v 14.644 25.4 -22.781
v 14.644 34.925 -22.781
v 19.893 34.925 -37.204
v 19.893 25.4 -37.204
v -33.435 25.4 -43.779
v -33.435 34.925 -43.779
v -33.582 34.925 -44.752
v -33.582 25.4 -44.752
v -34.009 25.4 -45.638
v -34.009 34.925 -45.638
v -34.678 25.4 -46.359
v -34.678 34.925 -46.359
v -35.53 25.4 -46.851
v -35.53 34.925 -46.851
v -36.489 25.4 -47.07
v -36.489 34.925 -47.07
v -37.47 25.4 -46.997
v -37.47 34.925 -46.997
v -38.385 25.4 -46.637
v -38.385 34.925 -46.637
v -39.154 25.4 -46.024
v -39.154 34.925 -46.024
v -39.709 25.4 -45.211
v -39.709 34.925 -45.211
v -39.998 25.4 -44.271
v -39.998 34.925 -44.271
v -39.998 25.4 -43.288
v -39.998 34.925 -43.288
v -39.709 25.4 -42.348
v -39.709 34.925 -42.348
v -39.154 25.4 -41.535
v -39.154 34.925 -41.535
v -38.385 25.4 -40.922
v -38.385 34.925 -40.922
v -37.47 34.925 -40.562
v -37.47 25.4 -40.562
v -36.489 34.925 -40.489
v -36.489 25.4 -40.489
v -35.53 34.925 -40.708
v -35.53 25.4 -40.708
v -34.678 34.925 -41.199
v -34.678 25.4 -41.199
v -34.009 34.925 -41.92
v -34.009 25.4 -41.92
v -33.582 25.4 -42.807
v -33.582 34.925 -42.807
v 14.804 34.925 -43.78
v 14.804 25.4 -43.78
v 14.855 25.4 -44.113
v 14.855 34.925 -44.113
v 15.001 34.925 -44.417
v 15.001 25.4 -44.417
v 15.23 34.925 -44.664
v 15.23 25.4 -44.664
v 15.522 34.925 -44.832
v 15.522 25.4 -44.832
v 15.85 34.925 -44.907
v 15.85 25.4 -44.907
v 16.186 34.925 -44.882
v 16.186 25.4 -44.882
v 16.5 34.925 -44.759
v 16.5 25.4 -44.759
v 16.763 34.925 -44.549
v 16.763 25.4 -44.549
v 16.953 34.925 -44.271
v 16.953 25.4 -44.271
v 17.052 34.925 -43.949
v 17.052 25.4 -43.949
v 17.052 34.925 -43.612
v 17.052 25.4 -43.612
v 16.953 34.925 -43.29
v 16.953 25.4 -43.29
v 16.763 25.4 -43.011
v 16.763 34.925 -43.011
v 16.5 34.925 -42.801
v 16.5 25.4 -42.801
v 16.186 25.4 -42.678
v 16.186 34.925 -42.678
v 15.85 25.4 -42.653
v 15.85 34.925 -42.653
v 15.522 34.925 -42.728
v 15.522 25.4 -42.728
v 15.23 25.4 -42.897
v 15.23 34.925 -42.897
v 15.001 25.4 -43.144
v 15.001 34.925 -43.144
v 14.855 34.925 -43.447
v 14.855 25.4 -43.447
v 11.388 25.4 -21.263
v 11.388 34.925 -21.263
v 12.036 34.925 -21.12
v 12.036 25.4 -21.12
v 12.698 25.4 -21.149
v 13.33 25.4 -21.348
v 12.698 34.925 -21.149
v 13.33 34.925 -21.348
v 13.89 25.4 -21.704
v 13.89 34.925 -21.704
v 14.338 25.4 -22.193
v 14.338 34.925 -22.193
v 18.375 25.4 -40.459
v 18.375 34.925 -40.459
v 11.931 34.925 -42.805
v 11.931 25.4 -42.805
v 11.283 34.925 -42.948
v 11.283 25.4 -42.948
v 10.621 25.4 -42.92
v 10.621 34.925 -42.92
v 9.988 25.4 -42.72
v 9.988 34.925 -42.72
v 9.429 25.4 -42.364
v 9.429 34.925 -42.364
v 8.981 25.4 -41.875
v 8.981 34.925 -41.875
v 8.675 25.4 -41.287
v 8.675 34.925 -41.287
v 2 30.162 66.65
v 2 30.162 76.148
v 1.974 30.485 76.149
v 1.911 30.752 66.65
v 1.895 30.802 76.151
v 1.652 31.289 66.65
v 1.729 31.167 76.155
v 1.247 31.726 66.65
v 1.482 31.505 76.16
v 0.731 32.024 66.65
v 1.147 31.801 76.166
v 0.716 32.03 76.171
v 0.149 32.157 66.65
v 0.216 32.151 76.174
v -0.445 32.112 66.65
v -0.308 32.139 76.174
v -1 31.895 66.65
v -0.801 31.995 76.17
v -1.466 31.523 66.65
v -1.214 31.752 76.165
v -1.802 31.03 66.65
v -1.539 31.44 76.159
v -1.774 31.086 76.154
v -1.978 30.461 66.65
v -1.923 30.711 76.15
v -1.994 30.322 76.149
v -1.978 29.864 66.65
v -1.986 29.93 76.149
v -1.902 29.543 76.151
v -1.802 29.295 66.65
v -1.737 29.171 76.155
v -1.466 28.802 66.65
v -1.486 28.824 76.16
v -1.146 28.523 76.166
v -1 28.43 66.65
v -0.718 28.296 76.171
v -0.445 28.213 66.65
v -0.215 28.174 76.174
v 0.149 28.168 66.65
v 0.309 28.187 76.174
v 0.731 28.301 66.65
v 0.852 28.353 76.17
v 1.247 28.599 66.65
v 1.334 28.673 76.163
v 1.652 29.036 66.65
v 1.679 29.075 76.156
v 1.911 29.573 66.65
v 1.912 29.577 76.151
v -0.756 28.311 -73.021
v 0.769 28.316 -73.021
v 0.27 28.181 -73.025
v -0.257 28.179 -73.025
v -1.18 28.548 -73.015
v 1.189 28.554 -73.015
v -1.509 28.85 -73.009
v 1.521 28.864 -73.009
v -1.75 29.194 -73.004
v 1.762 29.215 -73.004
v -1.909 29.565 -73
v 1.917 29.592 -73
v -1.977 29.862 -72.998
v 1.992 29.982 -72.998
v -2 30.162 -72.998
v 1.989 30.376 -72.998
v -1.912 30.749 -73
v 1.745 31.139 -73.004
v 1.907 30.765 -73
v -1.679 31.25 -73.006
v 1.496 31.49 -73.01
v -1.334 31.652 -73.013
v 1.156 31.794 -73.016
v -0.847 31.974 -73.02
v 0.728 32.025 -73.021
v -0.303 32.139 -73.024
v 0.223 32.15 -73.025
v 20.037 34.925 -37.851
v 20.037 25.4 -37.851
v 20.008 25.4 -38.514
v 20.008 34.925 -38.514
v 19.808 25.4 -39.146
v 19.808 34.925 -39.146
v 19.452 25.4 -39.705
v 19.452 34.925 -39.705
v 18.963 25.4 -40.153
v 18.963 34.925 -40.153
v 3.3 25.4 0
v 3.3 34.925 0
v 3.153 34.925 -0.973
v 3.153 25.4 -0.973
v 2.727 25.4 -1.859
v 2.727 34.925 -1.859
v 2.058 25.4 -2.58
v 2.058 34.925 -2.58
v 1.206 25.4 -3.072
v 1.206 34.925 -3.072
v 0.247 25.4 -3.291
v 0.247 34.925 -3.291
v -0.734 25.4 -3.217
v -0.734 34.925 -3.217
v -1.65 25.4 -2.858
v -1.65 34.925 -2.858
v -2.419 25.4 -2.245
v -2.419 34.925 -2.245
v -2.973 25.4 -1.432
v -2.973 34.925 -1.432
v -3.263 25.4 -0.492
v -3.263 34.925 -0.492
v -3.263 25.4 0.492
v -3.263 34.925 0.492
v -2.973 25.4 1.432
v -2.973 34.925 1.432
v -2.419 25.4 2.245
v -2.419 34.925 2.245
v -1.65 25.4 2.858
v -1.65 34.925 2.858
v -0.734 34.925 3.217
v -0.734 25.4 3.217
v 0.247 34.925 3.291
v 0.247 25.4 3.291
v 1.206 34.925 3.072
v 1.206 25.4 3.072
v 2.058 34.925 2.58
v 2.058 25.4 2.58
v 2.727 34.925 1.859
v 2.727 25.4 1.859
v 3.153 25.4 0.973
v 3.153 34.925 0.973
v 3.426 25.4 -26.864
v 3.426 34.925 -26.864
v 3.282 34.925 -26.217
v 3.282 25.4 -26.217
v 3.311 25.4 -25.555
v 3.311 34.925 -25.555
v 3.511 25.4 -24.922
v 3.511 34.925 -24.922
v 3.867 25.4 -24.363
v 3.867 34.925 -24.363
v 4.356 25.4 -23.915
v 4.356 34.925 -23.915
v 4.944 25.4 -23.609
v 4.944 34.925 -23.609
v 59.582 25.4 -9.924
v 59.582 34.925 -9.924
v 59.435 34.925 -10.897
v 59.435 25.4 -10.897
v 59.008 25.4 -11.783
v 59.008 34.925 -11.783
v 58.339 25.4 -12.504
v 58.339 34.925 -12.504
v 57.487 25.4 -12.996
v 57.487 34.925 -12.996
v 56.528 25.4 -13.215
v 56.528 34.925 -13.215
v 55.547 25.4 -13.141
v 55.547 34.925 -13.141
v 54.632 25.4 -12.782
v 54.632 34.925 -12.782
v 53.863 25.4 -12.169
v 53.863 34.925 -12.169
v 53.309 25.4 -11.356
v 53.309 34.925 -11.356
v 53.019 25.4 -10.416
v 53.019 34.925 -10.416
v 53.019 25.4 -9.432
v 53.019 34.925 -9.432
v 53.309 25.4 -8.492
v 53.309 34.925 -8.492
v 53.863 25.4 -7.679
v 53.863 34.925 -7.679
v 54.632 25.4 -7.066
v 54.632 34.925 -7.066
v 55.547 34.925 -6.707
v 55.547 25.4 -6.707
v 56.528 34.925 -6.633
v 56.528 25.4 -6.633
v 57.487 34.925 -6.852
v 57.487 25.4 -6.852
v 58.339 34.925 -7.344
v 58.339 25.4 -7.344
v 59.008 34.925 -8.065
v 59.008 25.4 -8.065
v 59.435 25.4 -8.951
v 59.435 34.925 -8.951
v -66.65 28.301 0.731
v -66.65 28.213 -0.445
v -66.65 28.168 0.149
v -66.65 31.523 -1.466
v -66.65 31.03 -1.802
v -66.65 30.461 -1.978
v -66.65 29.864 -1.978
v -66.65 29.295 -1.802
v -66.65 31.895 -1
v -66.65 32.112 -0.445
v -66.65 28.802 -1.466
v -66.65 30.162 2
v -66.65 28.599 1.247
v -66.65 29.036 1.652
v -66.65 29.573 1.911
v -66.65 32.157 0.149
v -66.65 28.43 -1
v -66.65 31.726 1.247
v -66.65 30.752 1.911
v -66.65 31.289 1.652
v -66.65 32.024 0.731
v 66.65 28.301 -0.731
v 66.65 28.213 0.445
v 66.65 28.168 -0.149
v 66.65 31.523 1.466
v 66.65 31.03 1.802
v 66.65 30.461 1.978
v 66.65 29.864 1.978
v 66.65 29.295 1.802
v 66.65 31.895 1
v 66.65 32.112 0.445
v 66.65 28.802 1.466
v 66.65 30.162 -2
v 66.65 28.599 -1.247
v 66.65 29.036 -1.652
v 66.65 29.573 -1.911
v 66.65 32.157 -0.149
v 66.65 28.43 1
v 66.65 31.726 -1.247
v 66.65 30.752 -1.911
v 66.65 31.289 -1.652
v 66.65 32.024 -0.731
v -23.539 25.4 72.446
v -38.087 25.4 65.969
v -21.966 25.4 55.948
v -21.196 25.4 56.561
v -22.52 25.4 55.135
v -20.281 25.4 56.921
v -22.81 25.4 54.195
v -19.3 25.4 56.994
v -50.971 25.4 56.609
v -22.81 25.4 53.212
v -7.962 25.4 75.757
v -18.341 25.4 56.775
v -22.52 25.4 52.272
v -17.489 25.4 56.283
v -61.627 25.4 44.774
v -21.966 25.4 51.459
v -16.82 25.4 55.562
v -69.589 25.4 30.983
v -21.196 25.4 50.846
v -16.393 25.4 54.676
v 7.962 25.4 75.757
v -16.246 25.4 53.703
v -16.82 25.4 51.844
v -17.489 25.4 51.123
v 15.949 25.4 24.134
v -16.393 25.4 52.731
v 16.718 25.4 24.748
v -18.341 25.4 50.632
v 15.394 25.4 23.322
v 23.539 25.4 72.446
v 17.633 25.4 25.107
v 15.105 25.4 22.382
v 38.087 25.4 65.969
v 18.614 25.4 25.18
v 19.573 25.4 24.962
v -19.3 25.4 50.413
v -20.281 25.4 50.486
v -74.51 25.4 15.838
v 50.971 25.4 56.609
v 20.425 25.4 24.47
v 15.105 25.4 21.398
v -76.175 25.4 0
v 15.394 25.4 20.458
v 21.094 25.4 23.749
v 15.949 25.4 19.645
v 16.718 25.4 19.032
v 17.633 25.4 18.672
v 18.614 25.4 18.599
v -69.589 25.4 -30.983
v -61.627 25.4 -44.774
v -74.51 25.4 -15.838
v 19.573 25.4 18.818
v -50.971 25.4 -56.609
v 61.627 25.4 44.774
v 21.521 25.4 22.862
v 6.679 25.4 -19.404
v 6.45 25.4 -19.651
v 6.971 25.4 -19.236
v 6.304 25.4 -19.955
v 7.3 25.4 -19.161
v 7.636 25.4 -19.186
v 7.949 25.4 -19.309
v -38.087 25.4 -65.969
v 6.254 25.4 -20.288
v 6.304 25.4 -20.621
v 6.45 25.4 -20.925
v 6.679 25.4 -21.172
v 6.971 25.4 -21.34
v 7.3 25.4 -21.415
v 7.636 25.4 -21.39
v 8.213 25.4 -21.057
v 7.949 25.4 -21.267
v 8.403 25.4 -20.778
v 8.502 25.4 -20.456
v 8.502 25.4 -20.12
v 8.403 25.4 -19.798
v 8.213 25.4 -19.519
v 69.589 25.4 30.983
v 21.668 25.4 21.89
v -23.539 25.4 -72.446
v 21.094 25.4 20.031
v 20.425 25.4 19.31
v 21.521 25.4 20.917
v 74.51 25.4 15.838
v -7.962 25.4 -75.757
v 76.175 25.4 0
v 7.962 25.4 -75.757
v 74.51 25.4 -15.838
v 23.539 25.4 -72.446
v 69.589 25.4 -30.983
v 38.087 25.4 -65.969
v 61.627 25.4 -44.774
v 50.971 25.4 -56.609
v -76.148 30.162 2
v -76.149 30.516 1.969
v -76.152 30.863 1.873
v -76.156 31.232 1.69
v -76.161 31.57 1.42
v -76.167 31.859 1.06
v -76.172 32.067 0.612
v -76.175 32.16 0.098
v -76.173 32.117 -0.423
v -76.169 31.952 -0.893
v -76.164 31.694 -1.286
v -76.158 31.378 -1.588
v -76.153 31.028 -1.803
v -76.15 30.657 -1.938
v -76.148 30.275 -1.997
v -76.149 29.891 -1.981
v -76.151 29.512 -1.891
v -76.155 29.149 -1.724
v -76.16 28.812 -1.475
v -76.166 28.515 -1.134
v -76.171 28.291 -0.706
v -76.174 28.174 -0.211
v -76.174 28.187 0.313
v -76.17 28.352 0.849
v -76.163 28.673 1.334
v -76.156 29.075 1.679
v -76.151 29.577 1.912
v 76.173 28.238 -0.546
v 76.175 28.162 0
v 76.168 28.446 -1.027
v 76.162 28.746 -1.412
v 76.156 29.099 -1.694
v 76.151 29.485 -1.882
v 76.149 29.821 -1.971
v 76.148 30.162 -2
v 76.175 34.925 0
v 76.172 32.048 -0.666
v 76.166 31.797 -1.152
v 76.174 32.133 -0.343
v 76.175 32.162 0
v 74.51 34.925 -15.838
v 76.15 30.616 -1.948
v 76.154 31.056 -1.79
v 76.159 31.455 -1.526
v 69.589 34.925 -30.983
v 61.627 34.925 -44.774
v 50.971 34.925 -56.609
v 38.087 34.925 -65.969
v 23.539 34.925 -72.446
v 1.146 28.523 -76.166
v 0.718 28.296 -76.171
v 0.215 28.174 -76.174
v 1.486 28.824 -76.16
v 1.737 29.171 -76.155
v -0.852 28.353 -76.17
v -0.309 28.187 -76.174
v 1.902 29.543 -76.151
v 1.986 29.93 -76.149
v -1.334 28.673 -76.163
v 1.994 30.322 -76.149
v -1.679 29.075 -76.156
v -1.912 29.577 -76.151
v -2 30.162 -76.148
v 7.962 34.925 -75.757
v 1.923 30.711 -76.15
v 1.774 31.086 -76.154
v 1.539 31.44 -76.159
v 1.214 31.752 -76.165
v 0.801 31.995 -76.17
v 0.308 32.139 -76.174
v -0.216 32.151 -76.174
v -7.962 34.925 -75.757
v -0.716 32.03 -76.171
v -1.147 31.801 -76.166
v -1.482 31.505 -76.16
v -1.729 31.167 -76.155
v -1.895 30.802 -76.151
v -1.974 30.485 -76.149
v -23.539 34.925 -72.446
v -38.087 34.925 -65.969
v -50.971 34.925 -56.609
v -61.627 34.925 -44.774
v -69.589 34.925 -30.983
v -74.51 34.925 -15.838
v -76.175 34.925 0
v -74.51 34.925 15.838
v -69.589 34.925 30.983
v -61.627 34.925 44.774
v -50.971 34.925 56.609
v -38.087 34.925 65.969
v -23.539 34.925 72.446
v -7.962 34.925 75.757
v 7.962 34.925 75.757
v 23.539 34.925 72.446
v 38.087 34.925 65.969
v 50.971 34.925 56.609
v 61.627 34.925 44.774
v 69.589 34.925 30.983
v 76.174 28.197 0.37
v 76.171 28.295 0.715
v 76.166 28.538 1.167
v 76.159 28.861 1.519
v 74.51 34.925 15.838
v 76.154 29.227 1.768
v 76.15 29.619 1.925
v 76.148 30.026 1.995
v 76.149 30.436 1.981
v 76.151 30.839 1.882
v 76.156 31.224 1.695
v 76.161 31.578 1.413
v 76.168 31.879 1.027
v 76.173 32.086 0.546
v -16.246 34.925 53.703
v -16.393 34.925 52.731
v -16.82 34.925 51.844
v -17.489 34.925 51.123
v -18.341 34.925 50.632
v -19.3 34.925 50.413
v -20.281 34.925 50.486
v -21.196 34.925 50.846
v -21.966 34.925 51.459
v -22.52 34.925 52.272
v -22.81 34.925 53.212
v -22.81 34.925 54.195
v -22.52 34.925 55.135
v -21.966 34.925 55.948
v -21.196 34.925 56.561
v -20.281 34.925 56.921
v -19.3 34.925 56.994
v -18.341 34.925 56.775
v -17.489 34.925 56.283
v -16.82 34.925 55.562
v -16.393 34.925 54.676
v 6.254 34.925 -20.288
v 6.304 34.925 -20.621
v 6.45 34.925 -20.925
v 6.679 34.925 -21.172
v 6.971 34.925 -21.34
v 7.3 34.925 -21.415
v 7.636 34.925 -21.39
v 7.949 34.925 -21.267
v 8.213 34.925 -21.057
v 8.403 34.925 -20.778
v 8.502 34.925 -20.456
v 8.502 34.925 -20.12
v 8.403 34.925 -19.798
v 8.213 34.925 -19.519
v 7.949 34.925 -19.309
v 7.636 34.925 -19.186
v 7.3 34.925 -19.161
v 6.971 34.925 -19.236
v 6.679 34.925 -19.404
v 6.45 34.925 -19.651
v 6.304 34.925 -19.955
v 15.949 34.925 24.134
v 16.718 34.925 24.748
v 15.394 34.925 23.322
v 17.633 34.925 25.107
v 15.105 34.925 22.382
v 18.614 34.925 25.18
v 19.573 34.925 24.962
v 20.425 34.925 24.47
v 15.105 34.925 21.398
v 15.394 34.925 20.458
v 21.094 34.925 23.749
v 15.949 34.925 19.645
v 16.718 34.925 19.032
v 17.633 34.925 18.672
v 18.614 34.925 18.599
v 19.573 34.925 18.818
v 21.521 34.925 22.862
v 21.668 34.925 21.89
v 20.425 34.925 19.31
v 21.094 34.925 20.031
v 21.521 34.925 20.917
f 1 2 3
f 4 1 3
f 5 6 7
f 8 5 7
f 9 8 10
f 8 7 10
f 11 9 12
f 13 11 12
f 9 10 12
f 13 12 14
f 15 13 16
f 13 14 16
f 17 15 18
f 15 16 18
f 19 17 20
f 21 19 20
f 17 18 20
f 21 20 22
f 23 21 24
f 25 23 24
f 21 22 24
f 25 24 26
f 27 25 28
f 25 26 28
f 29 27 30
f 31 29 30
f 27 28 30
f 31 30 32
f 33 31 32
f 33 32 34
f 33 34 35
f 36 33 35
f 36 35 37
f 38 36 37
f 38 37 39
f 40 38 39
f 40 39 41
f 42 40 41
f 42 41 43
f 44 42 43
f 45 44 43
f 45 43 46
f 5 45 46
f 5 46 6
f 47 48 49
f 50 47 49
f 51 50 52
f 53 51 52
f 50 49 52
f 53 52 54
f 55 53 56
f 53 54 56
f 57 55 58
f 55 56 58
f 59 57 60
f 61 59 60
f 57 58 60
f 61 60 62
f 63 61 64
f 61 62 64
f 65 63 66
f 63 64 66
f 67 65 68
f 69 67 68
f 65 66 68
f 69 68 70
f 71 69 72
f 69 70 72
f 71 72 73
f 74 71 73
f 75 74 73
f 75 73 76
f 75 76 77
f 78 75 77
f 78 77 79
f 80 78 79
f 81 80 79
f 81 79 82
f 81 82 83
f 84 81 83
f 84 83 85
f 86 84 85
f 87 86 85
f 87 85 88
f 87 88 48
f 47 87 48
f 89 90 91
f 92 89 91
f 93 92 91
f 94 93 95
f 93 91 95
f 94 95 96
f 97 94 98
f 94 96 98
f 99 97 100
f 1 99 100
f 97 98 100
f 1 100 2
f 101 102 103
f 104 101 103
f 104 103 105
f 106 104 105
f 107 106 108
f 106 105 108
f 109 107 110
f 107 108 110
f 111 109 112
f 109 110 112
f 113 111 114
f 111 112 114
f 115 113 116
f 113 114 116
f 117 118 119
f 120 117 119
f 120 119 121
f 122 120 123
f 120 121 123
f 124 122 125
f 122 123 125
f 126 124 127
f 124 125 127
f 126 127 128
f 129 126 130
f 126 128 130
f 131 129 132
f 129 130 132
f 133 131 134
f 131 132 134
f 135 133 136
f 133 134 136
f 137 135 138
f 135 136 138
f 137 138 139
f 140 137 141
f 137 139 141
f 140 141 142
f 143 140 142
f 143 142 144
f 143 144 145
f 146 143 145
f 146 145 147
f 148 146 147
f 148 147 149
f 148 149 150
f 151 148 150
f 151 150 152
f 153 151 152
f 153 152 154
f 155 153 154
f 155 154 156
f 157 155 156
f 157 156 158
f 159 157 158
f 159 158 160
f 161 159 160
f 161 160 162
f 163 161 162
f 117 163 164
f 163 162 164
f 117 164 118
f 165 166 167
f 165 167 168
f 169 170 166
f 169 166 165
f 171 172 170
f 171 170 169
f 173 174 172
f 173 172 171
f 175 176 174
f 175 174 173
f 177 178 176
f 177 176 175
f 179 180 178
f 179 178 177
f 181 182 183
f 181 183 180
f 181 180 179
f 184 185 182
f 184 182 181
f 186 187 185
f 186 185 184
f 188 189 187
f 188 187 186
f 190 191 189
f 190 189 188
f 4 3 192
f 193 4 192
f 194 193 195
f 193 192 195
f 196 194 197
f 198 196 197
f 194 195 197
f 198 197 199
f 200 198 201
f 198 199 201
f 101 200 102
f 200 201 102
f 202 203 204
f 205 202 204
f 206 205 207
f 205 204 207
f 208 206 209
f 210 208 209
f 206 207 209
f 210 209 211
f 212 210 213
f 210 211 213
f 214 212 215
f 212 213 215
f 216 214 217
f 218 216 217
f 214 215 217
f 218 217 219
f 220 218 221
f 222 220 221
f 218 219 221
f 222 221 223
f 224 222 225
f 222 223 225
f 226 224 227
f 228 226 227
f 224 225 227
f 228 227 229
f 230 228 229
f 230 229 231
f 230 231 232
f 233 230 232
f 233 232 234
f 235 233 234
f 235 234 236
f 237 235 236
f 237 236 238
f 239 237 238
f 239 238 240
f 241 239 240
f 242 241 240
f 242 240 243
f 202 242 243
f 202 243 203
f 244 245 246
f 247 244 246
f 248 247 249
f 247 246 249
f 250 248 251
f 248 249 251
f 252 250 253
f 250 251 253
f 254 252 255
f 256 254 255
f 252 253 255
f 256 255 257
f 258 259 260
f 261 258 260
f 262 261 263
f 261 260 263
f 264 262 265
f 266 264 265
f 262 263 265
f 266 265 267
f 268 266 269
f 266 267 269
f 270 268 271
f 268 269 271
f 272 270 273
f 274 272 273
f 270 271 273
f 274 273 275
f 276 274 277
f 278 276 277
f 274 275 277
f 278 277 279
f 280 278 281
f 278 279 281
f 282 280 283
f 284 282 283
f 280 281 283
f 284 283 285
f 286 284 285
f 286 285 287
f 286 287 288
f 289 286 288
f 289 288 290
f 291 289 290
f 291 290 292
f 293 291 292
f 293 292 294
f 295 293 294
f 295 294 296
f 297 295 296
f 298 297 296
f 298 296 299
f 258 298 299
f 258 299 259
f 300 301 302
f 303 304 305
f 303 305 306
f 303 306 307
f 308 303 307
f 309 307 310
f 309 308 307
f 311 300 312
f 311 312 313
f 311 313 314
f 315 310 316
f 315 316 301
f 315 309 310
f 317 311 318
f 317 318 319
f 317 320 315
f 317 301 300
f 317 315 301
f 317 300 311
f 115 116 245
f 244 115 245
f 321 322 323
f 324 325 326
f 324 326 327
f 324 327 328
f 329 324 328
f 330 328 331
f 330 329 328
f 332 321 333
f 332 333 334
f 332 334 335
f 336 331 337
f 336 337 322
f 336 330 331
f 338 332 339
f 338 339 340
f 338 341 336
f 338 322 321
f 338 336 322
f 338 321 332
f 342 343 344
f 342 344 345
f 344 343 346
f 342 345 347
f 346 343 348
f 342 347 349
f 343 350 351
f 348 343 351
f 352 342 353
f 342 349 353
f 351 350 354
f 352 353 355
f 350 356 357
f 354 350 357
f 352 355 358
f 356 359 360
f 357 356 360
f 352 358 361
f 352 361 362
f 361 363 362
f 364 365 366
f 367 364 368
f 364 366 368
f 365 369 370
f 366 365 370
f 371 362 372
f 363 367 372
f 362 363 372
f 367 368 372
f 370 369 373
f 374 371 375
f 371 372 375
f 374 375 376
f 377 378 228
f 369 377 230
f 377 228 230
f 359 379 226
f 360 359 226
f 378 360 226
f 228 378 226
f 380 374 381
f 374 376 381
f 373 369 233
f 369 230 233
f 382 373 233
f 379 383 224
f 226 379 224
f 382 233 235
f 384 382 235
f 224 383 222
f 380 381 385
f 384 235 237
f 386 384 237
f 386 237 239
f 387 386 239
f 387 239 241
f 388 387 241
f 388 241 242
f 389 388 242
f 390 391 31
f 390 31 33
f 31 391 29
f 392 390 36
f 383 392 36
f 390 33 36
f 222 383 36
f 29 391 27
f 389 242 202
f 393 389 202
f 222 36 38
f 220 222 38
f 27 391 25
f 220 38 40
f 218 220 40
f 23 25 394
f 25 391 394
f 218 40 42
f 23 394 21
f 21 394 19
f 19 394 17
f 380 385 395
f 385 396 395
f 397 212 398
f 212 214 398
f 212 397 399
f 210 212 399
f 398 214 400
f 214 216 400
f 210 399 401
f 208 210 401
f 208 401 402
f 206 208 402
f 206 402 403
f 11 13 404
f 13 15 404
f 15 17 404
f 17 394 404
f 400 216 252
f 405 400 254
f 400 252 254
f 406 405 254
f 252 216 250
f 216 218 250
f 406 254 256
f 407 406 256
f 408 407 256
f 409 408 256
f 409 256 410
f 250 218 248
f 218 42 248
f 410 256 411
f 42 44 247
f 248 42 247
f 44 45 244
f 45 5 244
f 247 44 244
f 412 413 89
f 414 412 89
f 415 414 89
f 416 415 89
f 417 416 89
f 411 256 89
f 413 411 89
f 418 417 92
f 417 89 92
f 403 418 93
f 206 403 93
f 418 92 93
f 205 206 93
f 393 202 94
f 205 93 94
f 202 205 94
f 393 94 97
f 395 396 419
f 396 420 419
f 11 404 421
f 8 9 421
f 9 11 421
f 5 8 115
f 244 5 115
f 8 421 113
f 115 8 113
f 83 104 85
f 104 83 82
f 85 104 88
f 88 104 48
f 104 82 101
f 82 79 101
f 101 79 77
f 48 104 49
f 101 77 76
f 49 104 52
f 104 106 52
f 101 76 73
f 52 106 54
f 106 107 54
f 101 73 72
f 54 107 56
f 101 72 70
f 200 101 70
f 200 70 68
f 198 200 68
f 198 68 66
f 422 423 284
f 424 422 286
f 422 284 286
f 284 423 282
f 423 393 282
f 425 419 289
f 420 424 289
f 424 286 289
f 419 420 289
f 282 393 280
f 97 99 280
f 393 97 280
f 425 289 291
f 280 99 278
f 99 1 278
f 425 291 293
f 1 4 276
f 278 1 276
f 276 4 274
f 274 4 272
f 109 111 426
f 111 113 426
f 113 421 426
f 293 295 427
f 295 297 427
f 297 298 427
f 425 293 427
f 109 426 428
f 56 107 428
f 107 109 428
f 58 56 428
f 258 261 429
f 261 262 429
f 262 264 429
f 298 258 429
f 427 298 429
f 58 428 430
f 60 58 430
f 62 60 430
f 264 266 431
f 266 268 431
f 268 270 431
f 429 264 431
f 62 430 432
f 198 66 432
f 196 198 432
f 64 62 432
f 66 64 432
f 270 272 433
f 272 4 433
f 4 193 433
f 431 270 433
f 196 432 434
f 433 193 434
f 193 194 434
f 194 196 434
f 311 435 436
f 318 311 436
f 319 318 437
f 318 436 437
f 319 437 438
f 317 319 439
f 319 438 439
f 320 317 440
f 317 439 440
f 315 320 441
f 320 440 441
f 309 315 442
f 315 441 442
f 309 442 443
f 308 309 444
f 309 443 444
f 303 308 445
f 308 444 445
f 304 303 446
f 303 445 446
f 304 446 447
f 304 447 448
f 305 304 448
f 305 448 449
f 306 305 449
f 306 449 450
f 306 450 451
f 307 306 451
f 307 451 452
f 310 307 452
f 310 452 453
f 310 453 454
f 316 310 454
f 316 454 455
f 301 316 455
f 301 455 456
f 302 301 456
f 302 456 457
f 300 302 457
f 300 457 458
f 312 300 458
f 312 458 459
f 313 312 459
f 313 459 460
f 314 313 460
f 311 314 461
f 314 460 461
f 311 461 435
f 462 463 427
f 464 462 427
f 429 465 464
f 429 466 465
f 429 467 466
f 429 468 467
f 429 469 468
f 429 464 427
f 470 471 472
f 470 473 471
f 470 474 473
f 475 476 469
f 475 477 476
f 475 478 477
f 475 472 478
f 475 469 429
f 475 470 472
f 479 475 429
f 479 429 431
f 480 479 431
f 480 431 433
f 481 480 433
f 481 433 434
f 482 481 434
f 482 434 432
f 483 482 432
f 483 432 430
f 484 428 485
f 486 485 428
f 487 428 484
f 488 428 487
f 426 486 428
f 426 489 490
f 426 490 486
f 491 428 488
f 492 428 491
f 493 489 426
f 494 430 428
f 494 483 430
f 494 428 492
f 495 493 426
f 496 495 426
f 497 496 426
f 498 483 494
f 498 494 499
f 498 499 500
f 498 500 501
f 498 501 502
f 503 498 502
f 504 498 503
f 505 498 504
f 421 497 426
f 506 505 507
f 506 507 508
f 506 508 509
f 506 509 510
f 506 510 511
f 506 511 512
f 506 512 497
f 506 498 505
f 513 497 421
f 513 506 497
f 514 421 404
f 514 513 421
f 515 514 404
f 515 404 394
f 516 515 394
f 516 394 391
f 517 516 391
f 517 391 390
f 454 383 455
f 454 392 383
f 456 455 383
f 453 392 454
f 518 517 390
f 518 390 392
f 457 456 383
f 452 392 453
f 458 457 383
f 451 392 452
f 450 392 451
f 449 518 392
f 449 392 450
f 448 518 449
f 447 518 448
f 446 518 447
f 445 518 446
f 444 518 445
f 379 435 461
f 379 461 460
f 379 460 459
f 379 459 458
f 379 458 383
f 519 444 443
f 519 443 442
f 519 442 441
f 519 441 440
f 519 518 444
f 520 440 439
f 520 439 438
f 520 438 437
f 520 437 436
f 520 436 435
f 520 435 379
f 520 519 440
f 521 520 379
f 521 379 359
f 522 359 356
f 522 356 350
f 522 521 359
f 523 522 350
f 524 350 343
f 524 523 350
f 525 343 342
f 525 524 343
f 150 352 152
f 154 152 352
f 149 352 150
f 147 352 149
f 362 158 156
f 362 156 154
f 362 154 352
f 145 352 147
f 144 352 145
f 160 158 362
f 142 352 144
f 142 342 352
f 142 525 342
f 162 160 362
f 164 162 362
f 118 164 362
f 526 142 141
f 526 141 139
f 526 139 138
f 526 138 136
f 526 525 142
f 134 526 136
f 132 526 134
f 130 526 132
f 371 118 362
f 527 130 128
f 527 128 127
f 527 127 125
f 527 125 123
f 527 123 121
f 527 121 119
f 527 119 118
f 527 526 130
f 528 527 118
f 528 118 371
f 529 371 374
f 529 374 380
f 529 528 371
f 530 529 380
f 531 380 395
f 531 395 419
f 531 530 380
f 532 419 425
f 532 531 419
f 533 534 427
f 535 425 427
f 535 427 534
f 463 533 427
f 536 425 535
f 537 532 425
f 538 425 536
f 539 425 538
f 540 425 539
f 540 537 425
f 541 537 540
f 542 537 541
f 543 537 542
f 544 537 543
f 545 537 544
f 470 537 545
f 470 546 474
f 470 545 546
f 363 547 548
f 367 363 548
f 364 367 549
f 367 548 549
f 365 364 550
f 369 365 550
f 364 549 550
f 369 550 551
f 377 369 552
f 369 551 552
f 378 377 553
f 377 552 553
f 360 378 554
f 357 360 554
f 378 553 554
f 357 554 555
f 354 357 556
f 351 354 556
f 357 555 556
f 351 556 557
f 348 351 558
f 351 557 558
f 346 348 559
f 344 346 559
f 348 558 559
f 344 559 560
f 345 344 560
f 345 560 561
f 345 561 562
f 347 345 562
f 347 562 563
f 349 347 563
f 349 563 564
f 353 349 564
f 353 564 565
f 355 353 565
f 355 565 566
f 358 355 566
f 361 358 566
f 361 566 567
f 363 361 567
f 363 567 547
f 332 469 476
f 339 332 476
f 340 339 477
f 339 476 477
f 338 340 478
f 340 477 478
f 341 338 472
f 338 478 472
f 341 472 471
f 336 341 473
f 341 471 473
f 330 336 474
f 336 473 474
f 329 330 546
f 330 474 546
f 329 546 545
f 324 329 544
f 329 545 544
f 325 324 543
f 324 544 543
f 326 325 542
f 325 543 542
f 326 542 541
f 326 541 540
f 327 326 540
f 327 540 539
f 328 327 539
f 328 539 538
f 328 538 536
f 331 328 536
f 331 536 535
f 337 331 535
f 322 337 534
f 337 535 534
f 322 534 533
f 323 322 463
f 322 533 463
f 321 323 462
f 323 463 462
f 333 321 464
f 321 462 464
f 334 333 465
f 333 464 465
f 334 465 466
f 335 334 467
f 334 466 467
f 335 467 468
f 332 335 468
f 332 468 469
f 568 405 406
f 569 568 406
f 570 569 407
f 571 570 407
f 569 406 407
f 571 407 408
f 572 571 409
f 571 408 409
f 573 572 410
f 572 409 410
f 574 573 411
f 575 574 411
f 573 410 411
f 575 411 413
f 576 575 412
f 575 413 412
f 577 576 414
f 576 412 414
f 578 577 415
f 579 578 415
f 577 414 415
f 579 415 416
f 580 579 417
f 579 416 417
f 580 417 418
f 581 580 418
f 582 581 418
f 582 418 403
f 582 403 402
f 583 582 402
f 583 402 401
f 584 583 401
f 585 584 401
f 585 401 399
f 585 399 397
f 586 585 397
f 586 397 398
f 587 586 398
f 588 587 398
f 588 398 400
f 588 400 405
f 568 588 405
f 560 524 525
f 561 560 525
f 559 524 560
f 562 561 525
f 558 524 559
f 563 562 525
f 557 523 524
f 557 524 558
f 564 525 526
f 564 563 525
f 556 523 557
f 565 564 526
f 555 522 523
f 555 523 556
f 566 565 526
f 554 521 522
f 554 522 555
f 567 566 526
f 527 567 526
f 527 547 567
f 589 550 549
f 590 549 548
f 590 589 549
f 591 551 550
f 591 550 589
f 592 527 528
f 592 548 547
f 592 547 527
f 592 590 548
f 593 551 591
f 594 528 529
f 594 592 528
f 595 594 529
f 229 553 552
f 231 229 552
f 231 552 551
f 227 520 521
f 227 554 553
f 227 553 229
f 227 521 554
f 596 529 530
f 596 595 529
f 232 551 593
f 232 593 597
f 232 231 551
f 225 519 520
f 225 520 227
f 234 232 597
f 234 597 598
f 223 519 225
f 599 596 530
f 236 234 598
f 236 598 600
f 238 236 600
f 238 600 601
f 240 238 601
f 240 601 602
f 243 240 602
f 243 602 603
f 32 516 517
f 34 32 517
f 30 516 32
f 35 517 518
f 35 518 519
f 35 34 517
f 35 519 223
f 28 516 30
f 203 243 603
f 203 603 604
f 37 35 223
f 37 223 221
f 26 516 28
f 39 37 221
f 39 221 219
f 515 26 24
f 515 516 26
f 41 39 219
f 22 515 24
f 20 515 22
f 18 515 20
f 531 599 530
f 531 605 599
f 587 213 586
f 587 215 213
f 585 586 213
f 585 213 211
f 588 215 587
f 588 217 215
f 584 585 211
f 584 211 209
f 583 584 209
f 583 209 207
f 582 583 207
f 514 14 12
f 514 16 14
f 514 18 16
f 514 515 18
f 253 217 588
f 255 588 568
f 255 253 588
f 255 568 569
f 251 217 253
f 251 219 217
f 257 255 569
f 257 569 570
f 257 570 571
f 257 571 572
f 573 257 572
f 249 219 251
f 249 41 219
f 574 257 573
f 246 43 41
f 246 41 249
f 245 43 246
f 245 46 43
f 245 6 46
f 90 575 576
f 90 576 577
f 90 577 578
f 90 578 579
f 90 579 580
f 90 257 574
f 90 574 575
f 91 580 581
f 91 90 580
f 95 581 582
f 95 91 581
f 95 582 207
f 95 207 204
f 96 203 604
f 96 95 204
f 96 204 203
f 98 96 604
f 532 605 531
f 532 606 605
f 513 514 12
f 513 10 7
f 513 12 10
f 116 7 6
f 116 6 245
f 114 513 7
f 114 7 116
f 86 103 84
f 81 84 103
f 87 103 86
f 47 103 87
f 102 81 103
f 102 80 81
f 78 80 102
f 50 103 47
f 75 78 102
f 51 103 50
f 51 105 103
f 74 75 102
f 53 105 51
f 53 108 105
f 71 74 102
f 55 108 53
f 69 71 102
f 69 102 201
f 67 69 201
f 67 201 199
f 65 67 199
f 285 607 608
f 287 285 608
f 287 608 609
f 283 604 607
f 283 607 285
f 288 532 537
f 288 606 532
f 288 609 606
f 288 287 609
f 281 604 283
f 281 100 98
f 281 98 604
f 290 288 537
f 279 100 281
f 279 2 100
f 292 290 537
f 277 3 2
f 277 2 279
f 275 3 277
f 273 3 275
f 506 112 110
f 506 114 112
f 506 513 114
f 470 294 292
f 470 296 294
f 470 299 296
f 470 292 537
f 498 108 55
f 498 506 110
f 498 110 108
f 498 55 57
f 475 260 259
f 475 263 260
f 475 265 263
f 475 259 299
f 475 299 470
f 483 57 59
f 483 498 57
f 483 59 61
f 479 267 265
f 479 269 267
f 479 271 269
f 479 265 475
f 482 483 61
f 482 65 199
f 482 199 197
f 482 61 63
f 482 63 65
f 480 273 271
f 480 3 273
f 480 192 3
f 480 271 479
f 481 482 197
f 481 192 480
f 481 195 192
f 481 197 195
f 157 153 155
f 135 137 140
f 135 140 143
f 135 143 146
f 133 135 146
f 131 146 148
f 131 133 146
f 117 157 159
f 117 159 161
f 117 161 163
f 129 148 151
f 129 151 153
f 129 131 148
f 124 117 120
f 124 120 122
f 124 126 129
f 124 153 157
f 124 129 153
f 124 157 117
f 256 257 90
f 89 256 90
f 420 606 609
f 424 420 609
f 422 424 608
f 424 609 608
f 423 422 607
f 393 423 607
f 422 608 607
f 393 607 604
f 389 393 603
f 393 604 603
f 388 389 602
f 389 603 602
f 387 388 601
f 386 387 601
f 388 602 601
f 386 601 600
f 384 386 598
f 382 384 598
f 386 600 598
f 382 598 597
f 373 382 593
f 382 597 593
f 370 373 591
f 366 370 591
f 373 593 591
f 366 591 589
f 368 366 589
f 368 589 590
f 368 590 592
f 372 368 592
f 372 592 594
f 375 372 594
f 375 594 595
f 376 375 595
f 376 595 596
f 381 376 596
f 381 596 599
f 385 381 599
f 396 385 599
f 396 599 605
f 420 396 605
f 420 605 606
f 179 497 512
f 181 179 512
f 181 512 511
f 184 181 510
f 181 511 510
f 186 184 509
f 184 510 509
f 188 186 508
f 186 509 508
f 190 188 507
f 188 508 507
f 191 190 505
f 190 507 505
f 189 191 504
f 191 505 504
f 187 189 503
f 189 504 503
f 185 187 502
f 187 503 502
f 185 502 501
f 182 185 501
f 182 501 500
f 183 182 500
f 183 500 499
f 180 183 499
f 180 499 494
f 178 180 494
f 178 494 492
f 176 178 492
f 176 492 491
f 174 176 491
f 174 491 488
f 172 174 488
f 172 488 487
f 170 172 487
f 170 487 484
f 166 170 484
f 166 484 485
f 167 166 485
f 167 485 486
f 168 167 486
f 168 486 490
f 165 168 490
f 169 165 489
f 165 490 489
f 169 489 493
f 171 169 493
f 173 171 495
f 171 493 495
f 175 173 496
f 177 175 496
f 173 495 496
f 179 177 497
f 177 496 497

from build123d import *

# Parameters (mm, degrees)
SKETCH1_R                 = 78.359
BOSS_EXTRUDE1_DEPTH       = 25.4
SKETCH6_R                 = 76.1746
BOSS_EXTRUDE5_DEPTH       = 9.525
SKETCH7_R                 = 76.1746
BOSS_EXTRUDE6_DEPTH       = 9.525
SKETCH8_R                 = 73.025
CUT_EXTRUDE5_DEPTH        = 34.925
SKETCH3_R                 = 2
CUT_EXTRUDE2_DEPTH        = 9.525
CUT_EXTRUDE3_START        = 25.4
SKETCH1_7_R               = 78.359
SKETCH1_7_R_2             = 76.1746
CUT_EXTRUDE3_DEPTH        = 9.525
CIRPATTERN2_COUNT         = 3
SKETCH4_R                 = 73.025
BOSS_EXTRUDE4_DEPTH       = 9.525
CIRPATTERN3_COUNT         = 4
SKETCH9_R                 = 3.3
CUT_EXTRUDE6_DEPTH        = 45.4500001
SKETCH10_R                = 82.322787435
CUT_EXTRUDE7_DEPTH        = 35.9250001
TAP_DRILL_FOR_4_40_TAP1_D = 2.2606
CUT_EXTRUDE9_DEPTH        = 10.5250001


with BuildPart() as part:
    # Sketch1 → Boss-Extrude1 (new body)
    with BuildSketch(Plane(origin=(0, 0, 0), x_dir=(1, 0, 0), z_dir=(0, 1, 0))):
        Circle(SKETCH1_R)
    extrude(amount=BOSS_EXTRUDE1_DEPTH)

    # Sketch6 → Boss-Extrude5 (add)
    with BuildSketch(Plane(origin=(0, 25.4, 0), x_dir=(1, 0, 0), z_dir=(0, 1, 0))):
        Circle(SKETCH6_R)
    extrude(amount=BOSS_EXTRUDE5_DEPTH)

    # Sketch7 → Boss-Extrude6 (add)
    with BuildSketch(Plane.XZ):
        Circle(SKETCH7_R)
    extrude(amount=BOSS_EXTRUDE6_DEPTH)

    # Sketch8 → Cut-Extrude5 (cut)
    with BuildSketch(Plane.XZ.offset(9.525)):
        Circle(SKETCH8_R)
    extrude(amount=-CUT_EXTRUDE5_DEPTH, mode=Mode.SUBTRACT)

    # Sketch3 → Cut-Extrude2 (cut)
    with BuildSketch(Plane(origin=(0, 0, -76.1746), x_dir=(-1, 0, 0), z_dir=(0, 0, -1))):
        with Locations((0, 30.1625)):
            Circle(SKETCH3_R)
        with Locations((0, -4.7625)):
            Circle(SKETCH3_R)
    cut_extrude2 = extrude(amount=-CUT_EXTRUDE2_DEPTH, mode=Mode.SUBTRACT)

    # Sketch1<7> → Cut-Extrude3 (cut)
    with BuildSketch(Plane(origin=(0, 0, 0), x_dir=(1, 0, 0), z_dir=(0, 1, 0)).offset(CUT_EXTRUDE3_START)):
        Circle(SKETCH1_7_R)
        Circle(SKETCH1_7_R_2, mode=Mode.SUBTRACT)
    cut_extrude3 = extrude(amount=-CUT_EXTRUDE3_DEPTH, mode=Mode.SUBTRACT)

    # CirPattern2: Cut-Extrude3 ×3 about axis
    cirpattern2_axis = Axis((0, 0, 0), (0, 1, 0))
    for i in range(1, CIRPATTERN2_COUNT):
        add(cut_extrude3.rotate(cirpattern2_axis, i * 360 / CIRPATTERN2_COUNT), mode=Mode.SUBTRACT)

    # Sketch4 → Boss-Extrude4 (add)
    with BuildSketch(Plane(origin=(0, 34.925, 0), x_dir=(1, 0, 0), z_dir=(0, 1, 0))):
        Circle(SKETCH4_R)
    extrude(amount=-BOSS_EXTRUDE4_DEPTH)

    # CirPattern3: Cut-Extrude2 ×4 about axis
    cirpattern3_axis = Axis((0, 0, 0), (0, 1, 0))
    for i in range(1, CIRPATTERN3_COUNT):
        add(cut_extrude2.rotate(cirpattern3_axis, i * 360 / CIRPATTERN3_COUNT), mode=Mode.SUBTRACT)

    # Sketch9 → Cut-Extrude6 (cut, through all)
    with BuildSketch(Plane(origin=(0, 34.925, 0), x_dir=(1, 0, 0), z_dir=(0, 1, 0))):
        Circle(SKETCH9_R)
        with Locations((-19.546451191, -53.703433278)):
            Circle(SKETCH9_R)
        with Locations((-36.735311894, 43.779439924)):
            Circle(SKETCH9_R)
        with Locations((56.281763085, 9.923993354)):
            Circle(SKETCH9_R)
        with Locations((18.367655947, -21.889719962)):
            Circle(SKETCH9_R)
    extrude(amount=-CUT_EXTRUDE6_DEPTH, mode=Mode.SUBTRACT)

    # Sketch10 → Cut-Extrude7 (cut, through all)
    with BuildSketch(Plane(origin=(0, 25.4, 0), x_dir=(1, 0, 0), z_dir=(0, 1, 0))):
        Circle(SKETCH10_R)
    extrude(amount=-CUT_EXTRUDE7_DEPTH, mode=Mode.SUBTRACT)

    # Tap Drill for #4-40 Tap1 (through all)
    with Locations(Plane(origin=(0, 34.925, 0), x_dir=(1, 0, 0), z_dir=(0, 1, 0))):
        with Locations((7.384214894, 20.287963683), (15.934718491, 43.780279238)):
            Hole(TAP_DRILL_FOR_4_40_TAP1_D / 2)

    # Sketch14 → Cut-Extrude9 (cut, through all)
    with BuildSketch(Plane(origin=(0, 34.925, 0), x_dir=(1, 0, 0), z_dir=(0, 1, 0))):
        with BuildLine():
            Line((14.64382936, 22.781402035), (19.893154532, 37.203804415))
            ThreePointArc((19.893154532, 37.203804415), (19.808357055, 39.145985964), (18.37506644, 40.459354836))
            Line((18.37506644, 40.459354836), (11.930654446, 42.804928978))
            ThreePointArc((11.930654446, 42.804928978), (9.988472897, 42.720131501), (8.675104025, 41.286840886))
            Line((8.675104025, 41.286840886), (3.425778853, 26.864438506))
            ThreePointArc((3.425778853, 26.864438506), (3.51057633, 24.922256957), (4.943866945, 23.608888085))
            Line((4.943866945, 23.608888085), (11.388278939, 21.263313942))
            ThreePointArc((11.388278939, 21.263313942), (13.330460488, 21.34811142), (14.64382936, 22.781402035))
        make_face()
    extrude(amount=-CUT_EXTRUDE9_DEPTH, mode=Mode.SUBTRACT)


solid = part.part
